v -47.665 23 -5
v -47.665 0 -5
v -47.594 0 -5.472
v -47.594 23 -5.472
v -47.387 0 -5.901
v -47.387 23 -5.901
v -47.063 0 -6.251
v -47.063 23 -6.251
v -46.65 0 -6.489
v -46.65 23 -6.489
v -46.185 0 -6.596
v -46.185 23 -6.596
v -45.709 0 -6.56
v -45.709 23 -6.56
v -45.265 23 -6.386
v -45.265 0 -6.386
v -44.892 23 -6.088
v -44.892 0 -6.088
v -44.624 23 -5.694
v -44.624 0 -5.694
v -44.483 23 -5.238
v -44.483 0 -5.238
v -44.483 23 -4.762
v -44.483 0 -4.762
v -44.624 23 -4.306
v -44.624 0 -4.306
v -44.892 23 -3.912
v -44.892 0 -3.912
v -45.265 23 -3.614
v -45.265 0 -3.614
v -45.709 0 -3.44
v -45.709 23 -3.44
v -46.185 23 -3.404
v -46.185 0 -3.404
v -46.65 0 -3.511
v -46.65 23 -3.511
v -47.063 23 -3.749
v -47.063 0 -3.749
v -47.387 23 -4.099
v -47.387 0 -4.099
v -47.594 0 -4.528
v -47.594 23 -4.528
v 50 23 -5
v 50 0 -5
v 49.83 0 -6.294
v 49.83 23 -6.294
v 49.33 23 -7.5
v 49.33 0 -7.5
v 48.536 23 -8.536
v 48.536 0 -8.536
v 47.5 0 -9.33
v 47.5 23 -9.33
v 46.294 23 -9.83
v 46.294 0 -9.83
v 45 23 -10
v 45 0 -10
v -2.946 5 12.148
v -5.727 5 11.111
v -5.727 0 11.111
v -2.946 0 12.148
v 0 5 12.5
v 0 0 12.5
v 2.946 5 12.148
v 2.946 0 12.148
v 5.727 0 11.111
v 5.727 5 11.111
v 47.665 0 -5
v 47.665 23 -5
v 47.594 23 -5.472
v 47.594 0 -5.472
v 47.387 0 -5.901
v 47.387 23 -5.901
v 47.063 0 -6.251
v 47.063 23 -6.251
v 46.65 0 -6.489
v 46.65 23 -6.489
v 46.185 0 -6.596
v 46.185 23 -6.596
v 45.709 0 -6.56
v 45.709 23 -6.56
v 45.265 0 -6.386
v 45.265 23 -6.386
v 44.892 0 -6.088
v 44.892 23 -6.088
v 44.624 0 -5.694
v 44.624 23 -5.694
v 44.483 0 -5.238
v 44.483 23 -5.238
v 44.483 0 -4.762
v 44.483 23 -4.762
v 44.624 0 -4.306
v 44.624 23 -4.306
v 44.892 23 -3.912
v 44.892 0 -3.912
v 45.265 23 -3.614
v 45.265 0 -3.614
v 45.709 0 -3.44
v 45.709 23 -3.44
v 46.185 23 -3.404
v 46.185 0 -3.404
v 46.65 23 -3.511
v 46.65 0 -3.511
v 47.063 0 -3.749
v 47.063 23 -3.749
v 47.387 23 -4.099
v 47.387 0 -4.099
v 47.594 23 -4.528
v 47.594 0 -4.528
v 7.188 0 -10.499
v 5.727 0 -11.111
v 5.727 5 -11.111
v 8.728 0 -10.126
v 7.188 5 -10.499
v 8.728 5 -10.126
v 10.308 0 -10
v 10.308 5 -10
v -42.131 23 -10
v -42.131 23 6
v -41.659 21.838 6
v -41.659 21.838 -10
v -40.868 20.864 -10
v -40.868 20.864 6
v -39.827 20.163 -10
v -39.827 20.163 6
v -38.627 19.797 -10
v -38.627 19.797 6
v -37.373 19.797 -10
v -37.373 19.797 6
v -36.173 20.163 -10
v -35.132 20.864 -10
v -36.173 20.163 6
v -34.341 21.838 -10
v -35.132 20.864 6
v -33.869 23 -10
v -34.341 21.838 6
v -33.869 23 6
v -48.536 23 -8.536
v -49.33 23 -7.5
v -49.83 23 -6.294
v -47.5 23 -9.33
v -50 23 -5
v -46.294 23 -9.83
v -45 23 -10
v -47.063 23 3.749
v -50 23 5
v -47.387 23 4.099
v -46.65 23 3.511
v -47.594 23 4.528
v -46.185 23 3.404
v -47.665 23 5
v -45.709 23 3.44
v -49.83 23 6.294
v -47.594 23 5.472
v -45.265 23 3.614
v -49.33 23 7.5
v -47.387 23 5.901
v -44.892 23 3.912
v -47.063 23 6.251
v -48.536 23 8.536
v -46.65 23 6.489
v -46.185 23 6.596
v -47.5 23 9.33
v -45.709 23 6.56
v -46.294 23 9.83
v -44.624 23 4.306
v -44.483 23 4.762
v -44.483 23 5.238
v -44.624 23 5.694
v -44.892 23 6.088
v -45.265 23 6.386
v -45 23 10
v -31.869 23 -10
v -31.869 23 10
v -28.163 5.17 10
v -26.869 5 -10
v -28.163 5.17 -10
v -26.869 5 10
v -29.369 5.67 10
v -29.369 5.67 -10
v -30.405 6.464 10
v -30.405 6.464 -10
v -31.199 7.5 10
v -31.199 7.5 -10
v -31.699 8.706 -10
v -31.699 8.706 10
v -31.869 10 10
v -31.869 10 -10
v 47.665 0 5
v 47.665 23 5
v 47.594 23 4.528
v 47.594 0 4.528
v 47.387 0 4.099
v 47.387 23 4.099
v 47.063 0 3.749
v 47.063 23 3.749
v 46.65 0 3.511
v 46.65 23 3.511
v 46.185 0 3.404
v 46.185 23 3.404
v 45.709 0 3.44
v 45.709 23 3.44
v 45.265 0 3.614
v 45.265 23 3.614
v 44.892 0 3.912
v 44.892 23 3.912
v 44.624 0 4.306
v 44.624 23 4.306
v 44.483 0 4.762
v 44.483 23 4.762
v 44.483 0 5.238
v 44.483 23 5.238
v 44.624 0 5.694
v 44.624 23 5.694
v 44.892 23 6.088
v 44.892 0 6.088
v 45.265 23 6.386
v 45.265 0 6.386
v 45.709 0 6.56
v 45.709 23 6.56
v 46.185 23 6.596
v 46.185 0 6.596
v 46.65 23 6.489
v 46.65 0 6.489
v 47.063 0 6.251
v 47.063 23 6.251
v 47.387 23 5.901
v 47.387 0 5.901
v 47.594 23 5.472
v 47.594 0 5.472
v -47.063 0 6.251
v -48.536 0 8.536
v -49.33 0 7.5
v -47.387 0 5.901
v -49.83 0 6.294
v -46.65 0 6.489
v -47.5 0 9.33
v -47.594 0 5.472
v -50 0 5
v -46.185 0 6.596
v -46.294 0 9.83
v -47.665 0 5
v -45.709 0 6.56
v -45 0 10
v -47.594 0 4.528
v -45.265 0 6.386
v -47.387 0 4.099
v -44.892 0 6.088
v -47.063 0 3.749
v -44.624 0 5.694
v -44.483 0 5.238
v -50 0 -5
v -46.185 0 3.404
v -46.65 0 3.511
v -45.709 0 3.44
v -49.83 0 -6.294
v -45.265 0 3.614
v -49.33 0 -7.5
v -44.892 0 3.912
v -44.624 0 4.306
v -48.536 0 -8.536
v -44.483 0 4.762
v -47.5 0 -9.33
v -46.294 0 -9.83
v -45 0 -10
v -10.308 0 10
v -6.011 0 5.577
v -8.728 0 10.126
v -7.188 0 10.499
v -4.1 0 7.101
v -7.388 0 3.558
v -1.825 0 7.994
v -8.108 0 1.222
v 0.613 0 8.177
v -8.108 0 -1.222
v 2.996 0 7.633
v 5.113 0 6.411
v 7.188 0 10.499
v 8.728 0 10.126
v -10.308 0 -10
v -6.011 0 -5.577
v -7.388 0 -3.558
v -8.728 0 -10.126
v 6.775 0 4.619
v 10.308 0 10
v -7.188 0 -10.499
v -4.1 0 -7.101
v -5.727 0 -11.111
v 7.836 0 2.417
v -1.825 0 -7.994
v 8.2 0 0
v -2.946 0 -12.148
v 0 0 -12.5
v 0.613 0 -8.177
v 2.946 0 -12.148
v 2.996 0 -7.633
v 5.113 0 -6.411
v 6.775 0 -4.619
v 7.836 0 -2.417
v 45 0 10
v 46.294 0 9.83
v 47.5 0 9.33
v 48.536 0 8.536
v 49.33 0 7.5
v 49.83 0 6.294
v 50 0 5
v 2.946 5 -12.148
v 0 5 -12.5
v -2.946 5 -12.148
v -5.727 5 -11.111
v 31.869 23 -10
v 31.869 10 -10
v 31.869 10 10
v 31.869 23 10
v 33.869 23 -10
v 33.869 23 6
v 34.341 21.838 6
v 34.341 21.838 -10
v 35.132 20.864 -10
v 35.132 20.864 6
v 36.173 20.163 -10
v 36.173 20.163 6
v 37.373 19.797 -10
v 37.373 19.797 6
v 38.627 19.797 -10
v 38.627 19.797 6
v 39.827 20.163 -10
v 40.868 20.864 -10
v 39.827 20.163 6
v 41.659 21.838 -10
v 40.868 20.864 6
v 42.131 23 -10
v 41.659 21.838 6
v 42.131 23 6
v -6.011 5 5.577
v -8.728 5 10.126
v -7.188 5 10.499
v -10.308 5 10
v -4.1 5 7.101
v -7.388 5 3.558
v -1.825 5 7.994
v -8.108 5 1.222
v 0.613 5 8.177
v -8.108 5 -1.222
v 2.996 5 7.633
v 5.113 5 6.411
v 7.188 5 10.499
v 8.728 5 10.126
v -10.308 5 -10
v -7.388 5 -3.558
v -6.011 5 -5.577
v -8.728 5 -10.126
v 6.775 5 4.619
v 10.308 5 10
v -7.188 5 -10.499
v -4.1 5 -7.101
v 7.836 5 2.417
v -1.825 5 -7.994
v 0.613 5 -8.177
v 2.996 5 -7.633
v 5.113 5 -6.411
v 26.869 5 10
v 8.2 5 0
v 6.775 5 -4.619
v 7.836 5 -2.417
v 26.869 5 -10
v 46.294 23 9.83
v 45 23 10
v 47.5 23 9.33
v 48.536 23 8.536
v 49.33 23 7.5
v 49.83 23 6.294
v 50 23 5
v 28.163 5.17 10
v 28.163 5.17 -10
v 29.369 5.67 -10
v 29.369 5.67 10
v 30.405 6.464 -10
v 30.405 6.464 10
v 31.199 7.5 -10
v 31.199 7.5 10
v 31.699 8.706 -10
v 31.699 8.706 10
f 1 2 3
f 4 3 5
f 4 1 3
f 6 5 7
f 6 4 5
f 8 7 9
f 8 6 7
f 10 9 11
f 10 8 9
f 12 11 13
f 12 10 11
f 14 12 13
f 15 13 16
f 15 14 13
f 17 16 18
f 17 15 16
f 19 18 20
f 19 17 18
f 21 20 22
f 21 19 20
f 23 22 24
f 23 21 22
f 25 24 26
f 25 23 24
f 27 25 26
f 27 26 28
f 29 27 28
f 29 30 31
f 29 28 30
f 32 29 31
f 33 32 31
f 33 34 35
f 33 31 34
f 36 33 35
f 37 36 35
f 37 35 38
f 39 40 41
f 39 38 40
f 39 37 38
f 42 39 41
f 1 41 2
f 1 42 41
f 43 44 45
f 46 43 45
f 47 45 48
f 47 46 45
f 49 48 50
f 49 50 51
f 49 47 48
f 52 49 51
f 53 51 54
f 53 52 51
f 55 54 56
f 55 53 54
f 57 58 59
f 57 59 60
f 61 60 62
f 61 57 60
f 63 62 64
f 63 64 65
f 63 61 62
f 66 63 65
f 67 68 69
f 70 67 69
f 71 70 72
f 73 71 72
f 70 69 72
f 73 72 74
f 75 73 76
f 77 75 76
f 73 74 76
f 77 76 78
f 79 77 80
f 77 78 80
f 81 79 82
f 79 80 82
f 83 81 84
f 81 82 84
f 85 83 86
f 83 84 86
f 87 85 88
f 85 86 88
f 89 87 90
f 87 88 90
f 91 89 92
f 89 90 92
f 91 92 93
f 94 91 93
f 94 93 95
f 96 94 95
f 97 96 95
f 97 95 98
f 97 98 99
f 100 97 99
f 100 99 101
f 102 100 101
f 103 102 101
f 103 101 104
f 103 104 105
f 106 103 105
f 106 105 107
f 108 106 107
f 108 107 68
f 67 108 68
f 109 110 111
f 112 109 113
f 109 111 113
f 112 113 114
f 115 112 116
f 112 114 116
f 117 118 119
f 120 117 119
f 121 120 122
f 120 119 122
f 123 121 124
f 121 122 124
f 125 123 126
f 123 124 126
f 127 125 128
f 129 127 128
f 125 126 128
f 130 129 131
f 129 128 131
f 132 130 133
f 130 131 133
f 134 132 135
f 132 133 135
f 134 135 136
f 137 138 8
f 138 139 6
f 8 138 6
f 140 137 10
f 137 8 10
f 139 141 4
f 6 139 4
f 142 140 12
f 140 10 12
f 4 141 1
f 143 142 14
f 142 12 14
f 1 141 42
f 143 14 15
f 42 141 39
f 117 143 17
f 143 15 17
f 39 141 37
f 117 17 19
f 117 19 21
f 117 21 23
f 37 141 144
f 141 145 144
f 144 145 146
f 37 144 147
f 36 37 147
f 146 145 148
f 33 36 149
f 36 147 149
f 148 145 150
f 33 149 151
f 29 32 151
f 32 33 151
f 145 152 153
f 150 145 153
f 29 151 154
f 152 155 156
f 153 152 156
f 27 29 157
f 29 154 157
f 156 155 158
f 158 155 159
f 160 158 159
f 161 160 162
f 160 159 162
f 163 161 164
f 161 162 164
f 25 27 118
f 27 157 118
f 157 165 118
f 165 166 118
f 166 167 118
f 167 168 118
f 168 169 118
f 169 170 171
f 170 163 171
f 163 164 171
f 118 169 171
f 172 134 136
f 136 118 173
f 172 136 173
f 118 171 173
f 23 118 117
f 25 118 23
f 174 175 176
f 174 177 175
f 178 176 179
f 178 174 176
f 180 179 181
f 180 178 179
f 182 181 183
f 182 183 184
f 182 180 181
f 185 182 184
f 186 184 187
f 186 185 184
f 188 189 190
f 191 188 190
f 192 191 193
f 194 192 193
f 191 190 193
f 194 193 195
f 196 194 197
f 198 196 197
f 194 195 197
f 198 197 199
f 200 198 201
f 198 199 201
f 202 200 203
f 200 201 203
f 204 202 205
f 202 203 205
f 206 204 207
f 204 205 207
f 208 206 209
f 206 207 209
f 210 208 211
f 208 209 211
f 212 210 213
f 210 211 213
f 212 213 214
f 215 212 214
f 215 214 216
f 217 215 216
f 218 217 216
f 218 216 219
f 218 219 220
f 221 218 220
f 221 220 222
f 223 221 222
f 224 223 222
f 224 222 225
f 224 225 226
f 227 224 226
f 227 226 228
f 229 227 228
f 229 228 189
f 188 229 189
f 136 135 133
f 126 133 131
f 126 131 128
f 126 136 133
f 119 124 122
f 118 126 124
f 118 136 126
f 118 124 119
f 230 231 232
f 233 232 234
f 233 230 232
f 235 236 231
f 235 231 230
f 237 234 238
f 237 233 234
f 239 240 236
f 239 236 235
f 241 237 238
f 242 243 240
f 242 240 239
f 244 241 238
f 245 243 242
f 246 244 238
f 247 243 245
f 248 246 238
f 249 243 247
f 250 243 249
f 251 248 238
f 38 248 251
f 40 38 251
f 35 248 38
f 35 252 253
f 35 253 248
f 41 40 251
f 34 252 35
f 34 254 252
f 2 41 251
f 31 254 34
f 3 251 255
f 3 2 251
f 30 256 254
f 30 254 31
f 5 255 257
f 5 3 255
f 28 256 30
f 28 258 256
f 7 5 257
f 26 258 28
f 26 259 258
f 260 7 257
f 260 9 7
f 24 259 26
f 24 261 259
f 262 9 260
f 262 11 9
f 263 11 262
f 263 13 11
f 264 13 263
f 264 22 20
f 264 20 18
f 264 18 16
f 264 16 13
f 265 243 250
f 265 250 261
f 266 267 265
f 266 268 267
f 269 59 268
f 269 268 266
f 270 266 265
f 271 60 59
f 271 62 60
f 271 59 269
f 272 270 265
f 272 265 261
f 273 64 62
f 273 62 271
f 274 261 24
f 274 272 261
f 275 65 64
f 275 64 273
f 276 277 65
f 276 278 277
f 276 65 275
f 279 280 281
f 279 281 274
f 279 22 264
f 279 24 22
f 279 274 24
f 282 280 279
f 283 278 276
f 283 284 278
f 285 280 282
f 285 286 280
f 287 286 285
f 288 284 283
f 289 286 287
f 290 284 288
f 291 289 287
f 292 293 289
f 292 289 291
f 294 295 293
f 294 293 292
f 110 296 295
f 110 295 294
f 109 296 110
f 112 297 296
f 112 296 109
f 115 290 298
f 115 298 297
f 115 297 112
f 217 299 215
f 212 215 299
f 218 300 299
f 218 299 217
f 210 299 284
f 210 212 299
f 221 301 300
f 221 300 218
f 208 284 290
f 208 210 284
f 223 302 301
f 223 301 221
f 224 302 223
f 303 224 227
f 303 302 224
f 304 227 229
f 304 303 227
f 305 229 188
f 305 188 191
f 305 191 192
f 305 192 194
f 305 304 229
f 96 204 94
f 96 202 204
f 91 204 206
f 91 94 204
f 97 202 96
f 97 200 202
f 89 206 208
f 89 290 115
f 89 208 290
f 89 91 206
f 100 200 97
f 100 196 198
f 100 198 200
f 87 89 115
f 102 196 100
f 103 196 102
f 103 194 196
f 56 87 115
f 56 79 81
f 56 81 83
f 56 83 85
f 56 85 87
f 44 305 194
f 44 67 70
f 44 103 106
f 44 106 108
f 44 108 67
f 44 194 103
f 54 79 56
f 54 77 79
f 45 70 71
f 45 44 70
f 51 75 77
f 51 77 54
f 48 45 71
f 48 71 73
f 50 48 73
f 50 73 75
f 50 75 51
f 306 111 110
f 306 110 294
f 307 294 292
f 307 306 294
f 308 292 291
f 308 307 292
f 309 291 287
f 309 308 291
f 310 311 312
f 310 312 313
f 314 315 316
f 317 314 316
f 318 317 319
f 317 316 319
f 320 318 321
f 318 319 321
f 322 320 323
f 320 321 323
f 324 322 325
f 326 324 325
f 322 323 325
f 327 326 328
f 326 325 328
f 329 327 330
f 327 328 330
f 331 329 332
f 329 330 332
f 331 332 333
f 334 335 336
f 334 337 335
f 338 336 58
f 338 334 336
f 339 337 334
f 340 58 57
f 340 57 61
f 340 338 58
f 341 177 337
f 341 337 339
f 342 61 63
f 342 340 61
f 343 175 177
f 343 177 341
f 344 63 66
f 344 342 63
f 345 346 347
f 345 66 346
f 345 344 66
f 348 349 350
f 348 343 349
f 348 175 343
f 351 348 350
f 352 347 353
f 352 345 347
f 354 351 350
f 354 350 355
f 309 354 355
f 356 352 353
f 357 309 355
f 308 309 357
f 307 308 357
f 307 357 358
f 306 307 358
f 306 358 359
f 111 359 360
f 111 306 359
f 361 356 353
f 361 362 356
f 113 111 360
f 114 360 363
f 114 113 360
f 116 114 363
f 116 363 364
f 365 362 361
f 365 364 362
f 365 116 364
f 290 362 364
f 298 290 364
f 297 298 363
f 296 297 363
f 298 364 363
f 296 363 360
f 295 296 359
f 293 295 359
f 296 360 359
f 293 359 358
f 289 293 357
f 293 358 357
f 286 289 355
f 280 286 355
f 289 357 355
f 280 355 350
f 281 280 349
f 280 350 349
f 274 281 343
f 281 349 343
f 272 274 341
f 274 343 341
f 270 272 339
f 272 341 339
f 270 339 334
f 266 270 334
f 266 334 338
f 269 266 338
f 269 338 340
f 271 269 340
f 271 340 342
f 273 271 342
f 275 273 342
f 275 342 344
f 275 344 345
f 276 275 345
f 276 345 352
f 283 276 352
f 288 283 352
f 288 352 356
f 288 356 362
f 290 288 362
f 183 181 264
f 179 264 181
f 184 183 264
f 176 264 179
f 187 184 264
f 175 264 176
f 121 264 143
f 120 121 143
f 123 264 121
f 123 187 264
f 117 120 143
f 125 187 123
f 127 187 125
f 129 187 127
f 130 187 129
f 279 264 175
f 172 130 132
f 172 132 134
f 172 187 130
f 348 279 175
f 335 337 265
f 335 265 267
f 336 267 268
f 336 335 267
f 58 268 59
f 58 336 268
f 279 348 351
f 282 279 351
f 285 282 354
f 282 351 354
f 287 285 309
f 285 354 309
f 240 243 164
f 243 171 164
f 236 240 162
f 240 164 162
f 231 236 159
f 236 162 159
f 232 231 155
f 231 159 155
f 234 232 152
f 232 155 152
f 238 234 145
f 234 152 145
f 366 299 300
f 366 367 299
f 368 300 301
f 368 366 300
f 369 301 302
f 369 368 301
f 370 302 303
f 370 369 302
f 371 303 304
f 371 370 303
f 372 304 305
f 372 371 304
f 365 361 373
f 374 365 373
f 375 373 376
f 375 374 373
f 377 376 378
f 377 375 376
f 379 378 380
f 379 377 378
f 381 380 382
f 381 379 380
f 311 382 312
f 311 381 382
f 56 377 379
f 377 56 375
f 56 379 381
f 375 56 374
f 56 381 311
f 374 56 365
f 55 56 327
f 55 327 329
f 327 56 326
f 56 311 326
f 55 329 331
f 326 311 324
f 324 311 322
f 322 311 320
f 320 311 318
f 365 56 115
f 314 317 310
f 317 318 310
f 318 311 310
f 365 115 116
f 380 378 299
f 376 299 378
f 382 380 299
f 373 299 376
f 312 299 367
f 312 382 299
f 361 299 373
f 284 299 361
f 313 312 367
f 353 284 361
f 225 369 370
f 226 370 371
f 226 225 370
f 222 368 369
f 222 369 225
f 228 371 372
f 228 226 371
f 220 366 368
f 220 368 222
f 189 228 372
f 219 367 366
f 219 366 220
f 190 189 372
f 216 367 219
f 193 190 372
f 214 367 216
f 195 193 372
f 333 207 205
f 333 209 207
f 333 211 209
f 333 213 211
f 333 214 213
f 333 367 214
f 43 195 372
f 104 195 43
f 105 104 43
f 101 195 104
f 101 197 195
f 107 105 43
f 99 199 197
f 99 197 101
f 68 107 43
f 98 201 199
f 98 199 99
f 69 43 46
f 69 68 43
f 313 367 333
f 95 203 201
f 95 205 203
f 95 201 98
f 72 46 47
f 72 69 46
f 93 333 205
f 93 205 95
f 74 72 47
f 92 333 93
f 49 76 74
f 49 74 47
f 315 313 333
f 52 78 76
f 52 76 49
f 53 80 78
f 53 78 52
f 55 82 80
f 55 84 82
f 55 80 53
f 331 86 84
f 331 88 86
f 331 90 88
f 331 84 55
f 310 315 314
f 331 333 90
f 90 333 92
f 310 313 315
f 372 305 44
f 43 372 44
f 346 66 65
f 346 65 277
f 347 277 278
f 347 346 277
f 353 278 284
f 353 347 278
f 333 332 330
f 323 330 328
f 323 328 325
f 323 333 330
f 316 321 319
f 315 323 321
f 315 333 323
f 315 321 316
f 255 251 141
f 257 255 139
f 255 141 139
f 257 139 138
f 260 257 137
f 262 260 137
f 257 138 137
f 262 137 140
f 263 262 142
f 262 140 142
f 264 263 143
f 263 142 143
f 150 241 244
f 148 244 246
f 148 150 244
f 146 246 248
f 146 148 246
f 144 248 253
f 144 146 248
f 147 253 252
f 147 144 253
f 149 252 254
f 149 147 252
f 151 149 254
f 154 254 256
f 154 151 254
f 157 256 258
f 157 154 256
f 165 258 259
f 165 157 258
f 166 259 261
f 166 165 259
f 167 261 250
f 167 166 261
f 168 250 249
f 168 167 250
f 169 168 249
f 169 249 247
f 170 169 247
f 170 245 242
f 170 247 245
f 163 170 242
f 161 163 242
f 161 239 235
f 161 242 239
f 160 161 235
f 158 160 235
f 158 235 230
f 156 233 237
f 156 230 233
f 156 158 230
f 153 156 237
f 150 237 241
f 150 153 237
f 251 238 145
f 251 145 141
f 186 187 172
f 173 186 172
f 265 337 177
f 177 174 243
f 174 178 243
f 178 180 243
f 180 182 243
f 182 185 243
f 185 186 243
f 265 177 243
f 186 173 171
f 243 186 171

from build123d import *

# Parameters (mm, degrees)
SKETCH1_W               = 88
SKETCH1_H               = 20
BOSS_EXTRUDE1_DEPTH     = 48
SKETCH2_R               = 4.25
CUT_EXTRUDE1_DEPTH      = 21
SKETCH7_R               = 12.5
BOSS_EXTRUDE2_DEPTH     = 48
SKETCH4_R               = 8.2
CUT_EXTRUDE3_DEPTH      = 49
FILLET2_R               = 10
SKETCH9_W               = 27
SKETCH9_H               = 25
CUT_EXTRUDE4_DEPTH      = 89
SKETCH10_W              = 63.73864418
SKETCH10_H              = 20
CUT_EXTRUDE5_DEPTH      = 13.5
CUT_EXTRUDE5_DEPTH_BACK = 13.5
FILLET3_R               = 5
SKETCH11_W              = 20
SKETCH11_H              = 23
BOSS_EXTRUDE3_DEPTH     = 6
SKETCH12_R              = 1.6
CUT_EXTRUDE6_DEPTH      = 24
FILLET5_R               = 5
BOSS_EXTRUDE4_DEPTH     = 4


with BuildPart() as part:
    # Sketch1 → Boss-Extrude1 (new body)
    with BuildSketch(Plane(origin=(0, 0, 0), x_dir=(1, 0, 0), z_dir=(0, 1, 0))):
        Rectangle(SKETCH1_W, SKETCH1_H)
    extrude(amount=BOSS_EXTRUDE1_DEPTH)

    # Sketch2 → Cut-Extrude1 (cut, through all)
    with BuildSketch(Plane.XY.offset(10)):
        with Locations((-38, 24)):
            Circle(SKETCH2_R)
        with Locations((38, 24)):
            Circle(SKETCH2_R)
    extrude(amount=-CUT_EXTRUDE1_DEPTH, mode=Mode.SUBTRACT)

    # Sketch7 → Boss-Extrude2 (add)
    with BuildSketch(Plane(origin=(0, 48, 0), x_dir=(1, 0, 0), z_dir=(0, 1, 0))):
        Circle(SKETCH7_R)
    extrude(amount=-BOSS_EXTRUDE2_DEPTH)

    # Sketch4 → Cut-Extrude3 (cut, through all)
    with BuildSketch(Plane(origin=(0, 48, 0), x_dir=(1, 0, 0), z_dir=(0, 1, 0))):
        Circle(SKETCH4_R)
    extrude(amount=-CUT_EXTRUDE3_DEPTH, mode=Mode.SUBTRACT)

    # Fillet2
    fillet2_edges = [part.edges().sort_by_distance(p)[0] for p in [
        (7.5, 24, -10),
        (7.5, 24, 10),
        (-7.5, 24, -10),
        (-7.5, 24, 10),
    ]]
    fillet(fillet2_edges, radius=FILLET2_R)

    # Sketch9 → Cut-Extrude4 (cut, through all)
    with BuildSketch(Plane.ZY.offset(44)):
        with Locations((0, 35.5)):
            Rectangle(SKETCH9_W, SKETCH9_H)
    extrude(amount=-CUT_EXTRUDE4_DEPTH, mode=Mode.SUBTRACT)

    # Sketch10 → Cut-Extrude5 (cut, two sides)
    with BuildSketch(Plane.XY) as cut_extrude5_sk:
        with Locations((0, 15)):
            Rectangle(SKETCH10_W, SKETCH10_H)
    extrude(amount=CUT_EXTRUDE5_DEPTH, mode=Mode.SUBTRACT)
    extrude(cut_extrude5_sk.sketch, amount=-CUT_EXTRUDE5_DEPTH_BACK, mode=Mode.SUBTRACT)

    # Fillet3
    fillet3_edges = [part.edges().sort_by_distance(p)[0] for p in [
        (31.86932209, 5, 0),
        (-31.86932209, 5, 0),
    ]]
    fillet(fillet3_edges, radius=FILLET3_R)

    # Sketch11 → Boss-Extrude3 (add)
    with BuildSketch(Plane(origin=(44, 0, 0), x_dir=(0, 0, -1), z_dir=(1, 0, 0))):
        with Locations((0, 11.5)):
            Rectangle(SKETCH11_W, SKETCH11_H)
    boss_extrude3 = extrude(amount=BOSS_EXTRUDE3_DEPTH)

    # Sketch12 → Cut-Extrude6 (cut, through all)
    with BuildSketch(Plane(origin=(0, 23, 0), x_dir=(1, 0, 0), z_dir=(0, 1, 0))):
        with Locations((46.065338955, 5)):
            Circle(SKETCH12_R)
        with Locations((46.065338955, -5)):
            Circle(SKETCH12_R)
    cut_extrude6 = extrude(amount=-CUT_EXTRUDE6_DEPTH, mode=Mode.SUBTRACT)

    # Mirror1: Boss-Extrude3, Cut-Extrude6 across plane
    add(boss_extrude3.mirror(Plane(origin=(0, 0, 0), x_dir=(0, 0, 1), z_dir=(1, 0, 0))))
    add(cut_extrude6.mirror(Plane(origin=(0, 0, 0), x_dir=(0, 0, 1), z_dir=(1, 0, 0))), mode=Mode.SUBTRACT)

    # Fillet5
    fillet5_edges = [part.edges().sort_by_distance(p)[0] for p in [
        (50, 11.5, -10),
        (50, 11.5, 10),
        (-50, 11.5, 10),
        (-50, 11.5, -10),
    ]]
    fillet(fillet5_edges, radius=FILLET5_R)

    # Sketch13 → Boss-Extrude4 (add)
    with BuildSketch(Plane.XY.offset(10)):
        with BuildLine():
            Line((-42.13067791, 23), (-33.86932209, 23))
            ThreePointArc((-33.86932209, 23), (-38, 19.75), (-42.13067791, 23))
        make_face()
        with BuildLine():
            Line((33.86932209, 23), (42.13067791, 23))
            ThreePointArc((42.13067791, 23), (38, 19.75), (33.86932209, 23))
        make_face()
    extrude(amount=-BOSS_EXTRUDE4_DEPTH)


solid = part.part
